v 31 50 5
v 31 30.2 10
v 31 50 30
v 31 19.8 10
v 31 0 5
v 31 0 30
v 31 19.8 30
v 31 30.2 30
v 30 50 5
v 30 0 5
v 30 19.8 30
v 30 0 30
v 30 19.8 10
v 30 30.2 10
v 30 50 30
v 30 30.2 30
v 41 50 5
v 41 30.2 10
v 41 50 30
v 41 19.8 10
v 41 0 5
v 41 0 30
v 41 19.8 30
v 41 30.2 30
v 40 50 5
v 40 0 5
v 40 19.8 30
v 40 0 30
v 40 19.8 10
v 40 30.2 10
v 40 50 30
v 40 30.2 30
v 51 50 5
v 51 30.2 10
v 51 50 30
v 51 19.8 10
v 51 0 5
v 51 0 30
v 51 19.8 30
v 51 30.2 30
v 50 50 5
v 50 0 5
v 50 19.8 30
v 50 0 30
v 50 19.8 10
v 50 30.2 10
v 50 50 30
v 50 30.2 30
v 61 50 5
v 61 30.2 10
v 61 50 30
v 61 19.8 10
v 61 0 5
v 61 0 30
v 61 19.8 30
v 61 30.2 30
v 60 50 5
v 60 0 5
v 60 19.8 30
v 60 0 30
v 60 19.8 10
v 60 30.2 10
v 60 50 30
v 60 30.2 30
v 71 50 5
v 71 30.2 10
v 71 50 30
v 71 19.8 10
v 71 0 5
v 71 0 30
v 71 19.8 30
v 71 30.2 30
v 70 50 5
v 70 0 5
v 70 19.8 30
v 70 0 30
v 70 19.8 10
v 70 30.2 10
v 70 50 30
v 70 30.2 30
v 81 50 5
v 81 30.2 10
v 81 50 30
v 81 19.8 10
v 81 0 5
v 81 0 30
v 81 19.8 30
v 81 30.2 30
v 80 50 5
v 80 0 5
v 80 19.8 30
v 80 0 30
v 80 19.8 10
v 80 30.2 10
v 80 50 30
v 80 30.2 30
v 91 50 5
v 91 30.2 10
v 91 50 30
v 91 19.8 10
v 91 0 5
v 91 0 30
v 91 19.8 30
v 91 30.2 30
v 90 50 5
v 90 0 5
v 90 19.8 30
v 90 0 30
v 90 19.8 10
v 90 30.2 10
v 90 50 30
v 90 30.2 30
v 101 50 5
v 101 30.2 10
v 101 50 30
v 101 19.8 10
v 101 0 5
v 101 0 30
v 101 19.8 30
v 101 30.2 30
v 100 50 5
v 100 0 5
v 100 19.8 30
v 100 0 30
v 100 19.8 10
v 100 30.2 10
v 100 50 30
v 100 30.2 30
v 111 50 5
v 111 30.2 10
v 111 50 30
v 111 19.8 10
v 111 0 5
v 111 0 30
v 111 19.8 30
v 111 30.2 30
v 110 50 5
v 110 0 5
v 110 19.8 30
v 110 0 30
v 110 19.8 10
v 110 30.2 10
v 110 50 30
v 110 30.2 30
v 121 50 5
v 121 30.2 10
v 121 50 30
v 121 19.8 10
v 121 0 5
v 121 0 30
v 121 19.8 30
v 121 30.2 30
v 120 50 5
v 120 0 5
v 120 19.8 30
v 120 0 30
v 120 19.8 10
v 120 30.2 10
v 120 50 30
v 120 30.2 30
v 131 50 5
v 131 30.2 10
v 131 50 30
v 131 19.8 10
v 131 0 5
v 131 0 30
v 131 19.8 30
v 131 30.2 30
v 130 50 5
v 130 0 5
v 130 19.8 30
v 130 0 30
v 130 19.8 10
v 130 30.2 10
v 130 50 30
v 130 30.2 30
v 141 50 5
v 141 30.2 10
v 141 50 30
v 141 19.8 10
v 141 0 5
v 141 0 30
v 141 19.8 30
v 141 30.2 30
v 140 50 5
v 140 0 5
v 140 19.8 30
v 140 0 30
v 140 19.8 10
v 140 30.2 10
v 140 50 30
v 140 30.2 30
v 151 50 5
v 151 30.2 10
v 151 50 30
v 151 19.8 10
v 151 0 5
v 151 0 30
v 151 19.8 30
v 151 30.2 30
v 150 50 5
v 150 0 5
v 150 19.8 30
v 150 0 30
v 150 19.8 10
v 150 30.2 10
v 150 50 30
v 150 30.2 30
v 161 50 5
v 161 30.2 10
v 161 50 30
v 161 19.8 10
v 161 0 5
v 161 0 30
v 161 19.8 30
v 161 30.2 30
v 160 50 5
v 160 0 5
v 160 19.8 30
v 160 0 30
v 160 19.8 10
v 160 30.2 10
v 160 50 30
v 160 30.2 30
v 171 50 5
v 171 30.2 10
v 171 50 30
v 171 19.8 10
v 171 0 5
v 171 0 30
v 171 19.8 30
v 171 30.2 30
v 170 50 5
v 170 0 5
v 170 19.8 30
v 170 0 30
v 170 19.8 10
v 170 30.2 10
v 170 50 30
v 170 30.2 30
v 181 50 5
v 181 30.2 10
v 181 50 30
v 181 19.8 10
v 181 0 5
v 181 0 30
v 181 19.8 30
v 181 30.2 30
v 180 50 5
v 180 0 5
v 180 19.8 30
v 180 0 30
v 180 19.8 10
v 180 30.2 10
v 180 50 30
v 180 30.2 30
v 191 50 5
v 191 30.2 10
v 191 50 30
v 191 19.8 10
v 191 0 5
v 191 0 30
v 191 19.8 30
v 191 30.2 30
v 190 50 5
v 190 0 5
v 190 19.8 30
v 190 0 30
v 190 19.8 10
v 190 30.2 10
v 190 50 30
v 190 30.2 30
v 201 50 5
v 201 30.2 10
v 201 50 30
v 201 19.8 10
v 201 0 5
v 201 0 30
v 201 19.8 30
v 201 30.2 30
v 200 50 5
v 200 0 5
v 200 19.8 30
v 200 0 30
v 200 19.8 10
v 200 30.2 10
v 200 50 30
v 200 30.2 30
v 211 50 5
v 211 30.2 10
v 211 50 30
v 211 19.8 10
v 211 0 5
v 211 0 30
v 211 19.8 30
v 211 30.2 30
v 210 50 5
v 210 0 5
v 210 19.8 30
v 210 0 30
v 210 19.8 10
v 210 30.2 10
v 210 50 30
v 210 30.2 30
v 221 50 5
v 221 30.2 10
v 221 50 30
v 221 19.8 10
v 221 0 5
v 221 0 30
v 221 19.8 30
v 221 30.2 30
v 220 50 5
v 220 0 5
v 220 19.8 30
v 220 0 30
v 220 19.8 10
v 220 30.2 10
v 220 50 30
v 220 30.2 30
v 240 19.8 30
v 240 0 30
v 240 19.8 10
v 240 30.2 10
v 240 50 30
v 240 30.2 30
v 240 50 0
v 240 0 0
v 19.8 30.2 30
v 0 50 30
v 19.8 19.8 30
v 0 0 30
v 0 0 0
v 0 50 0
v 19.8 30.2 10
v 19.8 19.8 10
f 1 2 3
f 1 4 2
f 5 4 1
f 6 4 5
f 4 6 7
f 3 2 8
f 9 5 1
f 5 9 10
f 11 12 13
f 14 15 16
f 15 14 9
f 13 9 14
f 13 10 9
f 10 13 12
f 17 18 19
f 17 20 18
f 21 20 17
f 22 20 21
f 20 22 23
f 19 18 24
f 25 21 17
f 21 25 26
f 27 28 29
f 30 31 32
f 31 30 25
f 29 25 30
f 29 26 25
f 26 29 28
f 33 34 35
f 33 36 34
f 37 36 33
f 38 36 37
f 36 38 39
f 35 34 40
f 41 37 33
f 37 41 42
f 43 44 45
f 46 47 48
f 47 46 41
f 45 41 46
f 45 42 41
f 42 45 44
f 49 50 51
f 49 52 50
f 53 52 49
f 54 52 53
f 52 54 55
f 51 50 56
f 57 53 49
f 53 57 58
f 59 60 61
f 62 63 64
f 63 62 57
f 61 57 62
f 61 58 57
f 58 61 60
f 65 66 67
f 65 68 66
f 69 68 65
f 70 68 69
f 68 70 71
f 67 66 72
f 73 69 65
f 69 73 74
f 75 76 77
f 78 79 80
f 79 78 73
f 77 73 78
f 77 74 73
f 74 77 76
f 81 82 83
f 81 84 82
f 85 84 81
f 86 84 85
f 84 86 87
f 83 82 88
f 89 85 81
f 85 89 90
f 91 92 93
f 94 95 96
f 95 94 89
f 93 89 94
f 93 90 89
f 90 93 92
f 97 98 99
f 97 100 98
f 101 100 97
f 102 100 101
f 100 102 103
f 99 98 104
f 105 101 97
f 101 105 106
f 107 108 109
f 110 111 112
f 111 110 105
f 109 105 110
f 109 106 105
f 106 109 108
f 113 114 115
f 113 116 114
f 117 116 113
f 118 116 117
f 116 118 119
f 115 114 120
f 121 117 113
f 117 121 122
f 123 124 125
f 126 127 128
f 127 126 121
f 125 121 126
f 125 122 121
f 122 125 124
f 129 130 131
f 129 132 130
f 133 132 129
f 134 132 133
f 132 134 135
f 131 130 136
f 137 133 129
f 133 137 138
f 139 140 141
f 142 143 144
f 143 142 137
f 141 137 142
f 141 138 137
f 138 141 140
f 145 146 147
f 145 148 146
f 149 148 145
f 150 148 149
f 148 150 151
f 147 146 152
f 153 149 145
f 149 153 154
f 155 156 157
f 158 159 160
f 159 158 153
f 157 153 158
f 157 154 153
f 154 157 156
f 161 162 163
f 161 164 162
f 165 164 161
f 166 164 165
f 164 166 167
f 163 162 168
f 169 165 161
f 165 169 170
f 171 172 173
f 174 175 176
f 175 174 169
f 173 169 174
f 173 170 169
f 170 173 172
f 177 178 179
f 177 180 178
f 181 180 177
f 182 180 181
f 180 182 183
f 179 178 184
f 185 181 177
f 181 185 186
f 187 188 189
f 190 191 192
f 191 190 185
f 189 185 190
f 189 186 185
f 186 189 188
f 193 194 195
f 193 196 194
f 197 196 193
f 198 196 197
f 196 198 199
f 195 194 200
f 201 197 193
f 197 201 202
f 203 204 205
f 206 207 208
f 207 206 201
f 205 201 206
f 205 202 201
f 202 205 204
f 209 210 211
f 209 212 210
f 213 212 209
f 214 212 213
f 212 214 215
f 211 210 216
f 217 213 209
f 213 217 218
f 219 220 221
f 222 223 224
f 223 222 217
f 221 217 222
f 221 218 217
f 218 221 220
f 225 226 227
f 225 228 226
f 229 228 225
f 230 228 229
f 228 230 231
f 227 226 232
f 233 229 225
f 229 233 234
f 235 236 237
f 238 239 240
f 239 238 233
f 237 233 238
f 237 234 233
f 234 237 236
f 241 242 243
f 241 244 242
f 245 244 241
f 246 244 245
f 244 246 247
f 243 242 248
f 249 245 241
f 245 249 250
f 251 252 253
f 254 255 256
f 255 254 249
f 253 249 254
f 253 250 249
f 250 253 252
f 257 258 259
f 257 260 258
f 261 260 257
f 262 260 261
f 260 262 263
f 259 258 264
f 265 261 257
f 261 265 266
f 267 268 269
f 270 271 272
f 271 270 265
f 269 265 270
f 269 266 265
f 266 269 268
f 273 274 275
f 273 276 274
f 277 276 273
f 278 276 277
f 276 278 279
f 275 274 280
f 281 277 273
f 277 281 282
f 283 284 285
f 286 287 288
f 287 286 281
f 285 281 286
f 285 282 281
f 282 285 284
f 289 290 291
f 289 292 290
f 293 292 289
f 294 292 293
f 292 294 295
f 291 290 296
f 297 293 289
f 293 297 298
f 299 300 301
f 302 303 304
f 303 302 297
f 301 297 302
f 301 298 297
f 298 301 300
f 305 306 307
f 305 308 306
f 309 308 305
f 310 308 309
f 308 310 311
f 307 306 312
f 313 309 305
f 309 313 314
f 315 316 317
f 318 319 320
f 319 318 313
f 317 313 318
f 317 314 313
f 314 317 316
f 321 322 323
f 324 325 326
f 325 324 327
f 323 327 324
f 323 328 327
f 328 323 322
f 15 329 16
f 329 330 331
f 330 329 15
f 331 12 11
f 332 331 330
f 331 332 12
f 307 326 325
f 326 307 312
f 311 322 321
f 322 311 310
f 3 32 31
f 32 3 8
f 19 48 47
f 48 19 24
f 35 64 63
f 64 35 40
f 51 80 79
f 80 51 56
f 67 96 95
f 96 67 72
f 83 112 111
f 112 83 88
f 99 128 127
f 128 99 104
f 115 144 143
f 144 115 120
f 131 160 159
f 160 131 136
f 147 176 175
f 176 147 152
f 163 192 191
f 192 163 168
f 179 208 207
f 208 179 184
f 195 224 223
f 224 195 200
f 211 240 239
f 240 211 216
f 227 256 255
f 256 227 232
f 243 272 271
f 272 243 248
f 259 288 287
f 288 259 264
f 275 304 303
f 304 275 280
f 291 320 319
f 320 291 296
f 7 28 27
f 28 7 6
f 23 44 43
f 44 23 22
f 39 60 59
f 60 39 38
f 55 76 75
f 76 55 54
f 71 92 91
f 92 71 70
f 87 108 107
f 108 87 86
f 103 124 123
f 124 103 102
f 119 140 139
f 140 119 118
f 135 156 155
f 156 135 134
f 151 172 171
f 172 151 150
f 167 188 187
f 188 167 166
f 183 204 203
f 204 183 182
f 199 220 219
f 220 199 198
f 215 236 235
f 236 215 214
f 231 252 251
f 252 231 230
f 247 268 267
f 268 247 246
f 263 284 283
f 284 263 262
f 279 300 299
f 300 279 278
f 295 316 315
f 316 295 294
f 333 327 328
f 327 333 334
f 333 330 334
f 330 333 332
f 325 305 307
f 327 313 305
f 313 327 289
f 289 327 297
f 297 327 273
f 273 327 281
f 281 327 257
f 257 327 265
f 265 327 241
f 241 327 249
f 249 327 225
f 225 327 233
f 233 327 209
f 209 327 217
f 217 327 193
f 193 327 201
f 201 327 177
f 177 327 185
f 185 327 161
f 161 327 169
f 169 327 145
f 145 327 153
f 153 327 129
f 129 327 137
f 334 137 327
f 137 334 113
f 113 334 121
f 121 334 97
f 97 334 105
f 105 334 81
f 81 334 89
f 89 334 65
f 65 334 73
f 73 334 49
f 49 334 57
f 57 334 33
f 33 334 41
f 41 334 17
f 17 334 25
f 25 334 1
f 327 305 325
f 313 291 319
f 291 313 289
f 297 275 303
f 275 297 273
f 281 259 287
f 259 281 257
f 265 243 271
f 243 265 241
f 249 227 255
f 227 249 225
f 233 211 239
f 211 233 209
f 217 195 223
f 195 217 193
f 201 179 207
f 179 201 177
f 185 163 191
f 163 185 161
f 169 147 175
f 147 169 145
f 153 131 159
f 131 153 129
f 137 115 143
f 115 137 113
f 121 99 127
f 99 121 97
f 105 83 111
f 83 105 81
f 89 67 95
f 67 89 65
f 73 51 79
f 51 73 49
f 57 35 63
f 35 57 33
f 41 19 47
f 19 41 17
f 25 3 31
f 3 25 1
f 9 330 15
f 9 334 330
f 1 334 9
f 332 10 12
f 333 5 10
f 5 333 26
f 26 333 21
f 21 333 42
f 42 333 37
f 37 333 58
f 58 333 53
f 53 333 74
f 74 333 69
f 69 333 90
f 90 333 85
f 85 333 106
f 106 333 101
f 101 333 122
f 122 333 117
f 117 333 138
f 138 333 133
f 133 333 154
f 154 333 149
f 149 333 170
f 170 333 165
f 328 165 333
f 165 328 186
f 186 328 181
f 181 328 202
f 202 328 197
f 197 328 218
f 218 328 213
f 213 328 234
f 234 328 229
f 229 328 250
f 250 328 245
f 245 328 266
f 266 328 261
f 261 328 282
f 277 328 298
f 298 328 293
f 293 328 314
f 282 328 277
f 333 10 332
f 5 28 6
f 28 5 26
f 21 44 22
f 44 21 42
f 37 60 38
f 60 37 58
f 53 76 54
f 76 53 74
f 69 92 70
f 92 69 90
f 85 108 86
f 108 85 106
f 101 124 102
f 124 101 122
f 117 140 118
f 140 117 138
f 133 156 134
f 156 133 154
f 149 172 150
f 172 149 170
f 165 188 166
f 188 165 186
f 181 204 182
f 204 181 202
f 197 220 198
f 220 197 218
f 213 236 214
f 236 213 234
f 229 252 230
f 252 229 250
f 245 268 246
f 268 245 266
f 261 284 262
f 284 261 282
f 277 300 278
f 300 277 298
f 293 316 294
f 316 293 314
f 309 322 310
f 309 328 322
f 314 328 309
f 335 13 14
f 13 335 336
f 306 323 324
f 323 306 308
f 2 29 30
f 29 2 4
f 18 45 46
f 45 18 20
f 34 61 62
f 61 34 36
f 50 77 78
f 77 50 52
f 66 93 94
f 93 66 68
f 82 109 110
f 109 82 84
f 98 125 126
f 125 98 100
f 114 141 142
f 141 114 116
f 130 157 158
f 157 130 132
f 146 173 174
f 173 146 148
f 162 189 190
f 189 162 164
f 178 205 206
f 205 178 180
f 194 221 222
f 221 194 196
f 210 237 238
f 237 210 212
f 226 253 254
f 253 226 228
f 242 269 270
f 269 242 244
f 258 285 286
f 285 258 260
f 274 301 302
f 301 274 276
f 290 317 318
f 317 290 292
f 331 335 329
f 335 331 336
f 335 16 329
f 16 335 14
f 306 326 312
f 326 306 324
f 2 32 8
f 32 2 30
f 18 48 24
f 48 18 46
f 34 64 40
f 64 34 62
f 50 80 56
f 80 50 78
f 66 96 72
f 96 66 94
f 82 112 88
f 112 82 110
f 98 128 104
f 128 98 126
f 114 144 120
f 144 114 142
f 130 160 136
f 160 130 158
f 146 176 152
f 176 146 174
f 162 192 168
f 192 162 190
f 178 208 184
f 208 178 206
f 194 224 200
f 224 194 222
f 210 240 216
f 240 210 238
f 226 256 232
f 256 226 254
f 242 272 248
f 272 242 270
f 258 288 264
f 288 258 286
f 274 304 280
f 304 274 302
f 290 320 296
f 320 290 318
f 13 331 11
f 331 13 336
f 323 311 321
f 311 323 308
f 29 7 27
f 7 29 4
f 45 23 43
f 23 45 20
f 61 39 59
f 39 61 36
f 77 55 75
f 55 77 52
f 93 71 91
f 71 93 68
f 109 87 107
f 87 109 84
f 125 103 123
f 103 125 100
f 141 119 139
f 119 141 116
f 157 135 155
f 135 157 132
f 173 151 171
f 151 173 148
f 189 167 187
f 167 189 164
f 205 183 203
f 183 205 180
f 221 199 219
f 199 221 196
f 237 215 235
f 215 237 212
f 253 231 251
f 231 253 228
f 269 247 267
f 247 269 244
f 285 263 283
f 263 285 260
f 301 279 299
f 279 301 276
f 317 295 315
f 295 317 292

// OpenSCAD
//Adjustments
AluWidth = 10;
HoleAdjust = 0.4;
CutAdjust = 0.0;
WallExtraHeight = 10;
CutWidth = 1;
WallWidth = 20;
BottomHeight = 10;

CuttingBox(20);

module CuttingBox(maxSize)
{
    difference()
    {
        //Box
        cube([AluWidth*maxSize+2*WallWidth,
              AluWidth + 2*WallWidth,
              BottomHeight + AluWidth + WallExtraHeight]);
        translate([WallWidth-0.5*HoleAdjust, WallWidth-0.5*HoleAdjust,BottomHeight])
        cube([AluWidth*maxSize+2*WallWidth,
              AluWidth+HoleAdjust,
              BottomHeight + AluWidth + WallExtraHeight]);
        for(units = [1:maxSize])   
            //CutSlit
            translate([ AluWidth*units+WallWidth+CutAdjust,
                        -1,
                        0.5*BottomHeight])
            cube([  CutWidth,
                    AluWidth + 2*WallWidth + 2,
                    BottomHeight + AluWidth + WallExtraHeight]);
    }
}
